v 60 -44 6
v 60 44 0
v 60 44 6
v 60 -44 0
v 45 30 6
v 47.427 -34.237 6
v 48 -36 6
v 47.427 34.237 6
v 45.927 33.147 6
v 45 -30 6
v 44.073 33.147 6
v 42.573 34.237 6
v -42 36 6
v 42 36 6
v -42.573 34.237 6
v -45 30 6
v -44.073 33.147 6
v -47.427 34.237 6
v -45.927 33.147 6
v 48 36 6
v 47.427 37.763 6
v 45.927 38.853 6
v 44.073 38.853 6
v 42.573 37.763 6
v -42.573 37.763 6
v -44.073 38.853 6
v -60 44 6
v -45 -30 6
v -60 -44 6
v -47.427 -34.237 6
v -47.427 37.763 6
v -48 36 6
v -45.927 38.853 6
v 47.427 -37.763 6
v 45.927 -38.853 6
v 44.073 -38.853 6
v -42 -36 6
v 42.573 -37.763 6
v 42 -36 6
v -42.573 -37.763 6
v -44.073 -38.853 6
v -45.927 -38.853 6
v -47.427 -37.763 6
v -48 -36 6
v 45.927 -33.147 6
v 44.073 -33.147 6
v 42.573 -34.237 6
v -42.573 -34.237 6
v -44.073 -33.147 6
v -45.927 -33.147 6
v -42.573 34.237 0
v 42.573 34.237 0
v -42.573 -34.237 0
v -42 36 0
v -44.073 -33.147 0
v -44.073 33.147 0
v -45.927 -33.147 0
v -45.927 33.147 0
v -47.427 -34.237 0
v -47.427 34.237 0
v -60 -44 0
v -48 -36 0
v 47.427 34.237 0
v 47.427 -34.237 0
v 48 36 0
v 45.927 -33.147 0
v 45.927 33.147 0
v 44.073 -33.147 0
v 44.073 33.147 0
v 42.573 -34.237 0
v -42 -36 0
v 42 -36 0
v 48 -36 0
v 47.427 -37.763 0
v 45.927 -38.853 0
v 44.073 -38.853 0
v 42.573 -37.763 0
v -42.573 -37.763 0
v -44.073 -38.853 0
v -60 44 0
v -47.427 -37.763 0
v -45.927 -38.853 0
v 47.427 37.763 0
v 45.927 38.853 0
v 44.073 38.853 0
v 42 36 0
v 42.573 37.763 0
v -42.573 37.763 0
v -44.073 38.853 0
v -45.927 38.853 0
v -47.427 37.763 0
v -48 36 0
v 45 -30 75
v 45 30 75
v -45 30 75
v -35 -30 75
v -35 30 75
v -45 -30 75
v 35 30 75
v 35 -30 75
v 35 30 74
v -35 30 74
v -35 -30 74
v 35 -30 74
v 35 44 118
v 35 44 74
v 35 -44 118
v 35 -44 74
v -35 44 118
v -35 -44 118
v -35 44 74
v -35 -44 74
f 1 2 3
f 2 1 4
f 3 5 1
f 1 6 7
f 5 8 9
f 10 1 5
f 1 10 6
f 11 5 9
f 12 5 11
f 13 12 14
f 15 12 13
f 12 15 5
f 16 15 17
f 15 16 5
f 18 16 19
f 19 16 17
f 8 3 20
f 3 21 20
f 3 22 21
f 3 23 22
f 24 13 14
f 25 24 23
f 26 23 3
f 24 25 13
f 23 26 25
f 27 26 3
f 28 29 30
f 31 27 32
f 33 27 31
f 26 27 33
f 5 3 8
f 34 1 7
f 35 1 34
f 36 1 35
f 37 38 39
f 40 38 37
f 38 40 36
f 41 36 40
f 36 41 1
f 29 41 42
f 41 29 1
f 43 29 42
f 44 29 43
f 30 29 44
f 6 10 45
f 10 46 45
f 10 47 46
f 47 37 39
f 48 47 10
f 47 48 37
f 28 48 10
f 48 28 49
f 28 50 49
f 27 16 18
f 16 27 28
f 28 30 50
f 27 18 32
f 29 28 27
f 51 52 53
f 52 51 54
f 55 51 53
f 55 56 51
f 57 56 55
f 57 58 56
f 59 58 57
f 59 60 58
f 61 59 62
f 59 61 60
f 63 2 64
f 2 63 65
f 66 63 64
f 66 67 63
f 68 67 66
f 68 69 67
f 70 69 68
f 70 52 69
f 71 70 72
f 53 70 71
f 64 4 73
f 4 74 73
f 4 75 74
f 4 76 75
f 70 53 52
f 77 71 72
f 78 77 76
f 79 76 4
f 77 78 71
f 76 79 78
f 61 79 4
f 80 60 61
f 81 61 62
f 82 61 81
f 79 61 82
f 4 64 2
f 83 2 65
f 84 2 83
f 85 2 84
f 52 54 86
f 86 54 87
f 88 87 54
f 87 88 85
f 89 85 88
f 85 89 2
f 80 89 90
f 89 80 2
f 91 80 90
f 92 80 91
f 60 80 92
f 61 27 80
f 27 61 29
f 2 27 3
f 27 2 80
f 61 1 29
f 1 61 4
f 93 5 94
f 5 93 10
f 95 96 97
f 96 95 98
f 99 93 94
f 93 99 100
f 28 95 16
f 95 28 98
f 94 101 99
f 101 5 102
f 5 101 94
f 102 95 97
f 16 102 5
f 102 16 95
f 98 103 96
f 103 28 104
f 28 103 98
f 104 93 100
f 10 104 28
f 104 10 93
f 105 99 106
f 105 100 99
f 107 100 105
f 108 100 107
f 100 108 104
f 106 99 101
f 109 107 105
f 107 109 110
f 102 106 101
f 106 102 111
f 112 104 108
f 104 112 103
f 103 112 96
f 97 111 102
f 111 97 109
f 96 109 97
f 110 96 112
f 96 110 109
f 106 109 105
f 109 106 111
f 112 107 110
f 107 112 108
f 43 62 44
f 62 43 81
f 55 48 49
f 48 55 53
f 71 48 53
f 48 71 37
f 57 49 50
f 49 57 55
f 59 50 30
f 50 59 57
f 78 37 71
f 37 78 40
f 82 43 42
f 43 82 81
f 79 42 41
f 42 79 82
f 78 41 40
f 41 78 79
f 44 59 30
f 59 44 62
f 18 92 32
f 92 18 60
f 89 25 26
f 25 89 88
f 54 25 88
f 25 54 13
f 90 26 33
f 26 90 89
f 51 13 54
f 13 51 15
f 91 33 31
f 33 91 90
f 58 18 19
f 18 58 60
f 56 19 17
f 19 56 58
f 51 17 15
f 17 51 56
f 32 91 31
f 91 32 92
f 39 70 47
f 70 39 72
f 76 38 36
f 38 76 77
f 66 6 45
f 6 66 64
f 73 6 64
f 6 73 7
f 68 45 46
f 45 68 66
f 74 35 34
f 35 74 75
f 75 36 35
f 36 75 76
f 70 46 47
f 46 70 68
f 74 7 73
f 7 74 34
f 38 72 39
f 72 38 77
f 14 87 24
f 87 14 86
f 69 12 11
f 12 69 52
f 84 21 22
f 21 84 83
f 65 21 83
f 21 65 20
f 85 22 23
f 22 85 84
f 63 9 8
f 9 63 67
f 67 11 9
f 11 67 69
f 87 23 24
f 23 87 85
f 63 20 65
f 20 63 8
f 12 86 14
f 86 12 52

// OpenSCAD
// Parameters
overall_width_mm = 120; //[60:240:1]
overall_depth_mm = 88; //[44:176:1]
overall_height_mm = 120; //[60:240:1]
include_mounting_holes = 1; //[0:1:1]
mounting_hole_count = 4; //[2:4:1]
mounting_hole_diameter_mm = 6; //[3:10:0.5]
mounting_hole_pattern_mm = 90; //[50:160:1]
foot_thickness_mm = 6; //[3:12:0.5]
core_block_height_mm = 70; //[35:140:1]
bobbin_block_height_mm = 44; //[22:88:1]
corner_radius_mm = 2; //[0:8:0.5]
overlap_mm = 1; //[0.5:2:0.1]
foot_width_mm = 120; //[60:240:1]
foot_depth_mm = 88; //[44:176:1]
core_width_mm = 90; //[45:180:1]
core_depth_mm = 60; //[30:120:1]
bobbin_width_mm = 70; //[35:140:1]
bobbin_depth_mm = 88; //[44:176:1]

// Transformer - complete geometry
module transformer() {
  color("DimGray") {
    // Mounting Foot Plate
    translate([0, 0, foot_thickness_mm / 2])
      cube([foot_width_mm, foot_depth_mm, foot_thickness_mm], center=true);

    // Lamination Core Block
    translate([0, 0, foot_thickness_mm + core_block_height_mm / 2 - overlap_mm])
      cube([core_width_mm, core_depth_mm, core_block_height_mm], center=true);

    // Bobbin/Coil Block
    translate([0, 0, foot_thickness_mm + core_block_height_mm - overlap_mm + bobbin_block_height_mm / 2 - overlap_mm])
      cube([bobbin_width_mm, bobbin_depth_mm, bobbin_block_height_mm], center=true);
  }

  if (include_mounting_holes) {
    color("Black") {
      // Mounting Holes
      for (i = [-1, 1], j = [-1, 1]) {
        translate([i * mounting_hole_pattern_mm / 2, j * ((foot_depth_mm / 2) - (mounting_hole_diameter_mm) - corner_radius_mm), foot_thickness_mm / 2])
          cylinder(r=(mounting_hole_diameter_mm * include_mounting_holes) / 2, h=foot_thickness_mm + 2 * overlap_mm, center=true);
      }
    }
  }
}

// Assembly
module assembly() {
  difference() {
    transformer();
    if (include_mounting_holes) {
      union() {
        for (i = [-1, 1], j = [-1, 1]) {
          translate([i * mounting_hole_pattern_mm / 2, j * ((foot_depth_mm / 2) - (mounting_hole_diameter_mm) - corner_radius_mm), foot_thickness_mm / 2])
            cylinder(r=(mounting_hole_diameter_mm * include_mounting_holes) / 2, h=foot_thickness_mm + 2 * overlap_mm, center=true);
        }
      }
    }
  }
}

assembly();
